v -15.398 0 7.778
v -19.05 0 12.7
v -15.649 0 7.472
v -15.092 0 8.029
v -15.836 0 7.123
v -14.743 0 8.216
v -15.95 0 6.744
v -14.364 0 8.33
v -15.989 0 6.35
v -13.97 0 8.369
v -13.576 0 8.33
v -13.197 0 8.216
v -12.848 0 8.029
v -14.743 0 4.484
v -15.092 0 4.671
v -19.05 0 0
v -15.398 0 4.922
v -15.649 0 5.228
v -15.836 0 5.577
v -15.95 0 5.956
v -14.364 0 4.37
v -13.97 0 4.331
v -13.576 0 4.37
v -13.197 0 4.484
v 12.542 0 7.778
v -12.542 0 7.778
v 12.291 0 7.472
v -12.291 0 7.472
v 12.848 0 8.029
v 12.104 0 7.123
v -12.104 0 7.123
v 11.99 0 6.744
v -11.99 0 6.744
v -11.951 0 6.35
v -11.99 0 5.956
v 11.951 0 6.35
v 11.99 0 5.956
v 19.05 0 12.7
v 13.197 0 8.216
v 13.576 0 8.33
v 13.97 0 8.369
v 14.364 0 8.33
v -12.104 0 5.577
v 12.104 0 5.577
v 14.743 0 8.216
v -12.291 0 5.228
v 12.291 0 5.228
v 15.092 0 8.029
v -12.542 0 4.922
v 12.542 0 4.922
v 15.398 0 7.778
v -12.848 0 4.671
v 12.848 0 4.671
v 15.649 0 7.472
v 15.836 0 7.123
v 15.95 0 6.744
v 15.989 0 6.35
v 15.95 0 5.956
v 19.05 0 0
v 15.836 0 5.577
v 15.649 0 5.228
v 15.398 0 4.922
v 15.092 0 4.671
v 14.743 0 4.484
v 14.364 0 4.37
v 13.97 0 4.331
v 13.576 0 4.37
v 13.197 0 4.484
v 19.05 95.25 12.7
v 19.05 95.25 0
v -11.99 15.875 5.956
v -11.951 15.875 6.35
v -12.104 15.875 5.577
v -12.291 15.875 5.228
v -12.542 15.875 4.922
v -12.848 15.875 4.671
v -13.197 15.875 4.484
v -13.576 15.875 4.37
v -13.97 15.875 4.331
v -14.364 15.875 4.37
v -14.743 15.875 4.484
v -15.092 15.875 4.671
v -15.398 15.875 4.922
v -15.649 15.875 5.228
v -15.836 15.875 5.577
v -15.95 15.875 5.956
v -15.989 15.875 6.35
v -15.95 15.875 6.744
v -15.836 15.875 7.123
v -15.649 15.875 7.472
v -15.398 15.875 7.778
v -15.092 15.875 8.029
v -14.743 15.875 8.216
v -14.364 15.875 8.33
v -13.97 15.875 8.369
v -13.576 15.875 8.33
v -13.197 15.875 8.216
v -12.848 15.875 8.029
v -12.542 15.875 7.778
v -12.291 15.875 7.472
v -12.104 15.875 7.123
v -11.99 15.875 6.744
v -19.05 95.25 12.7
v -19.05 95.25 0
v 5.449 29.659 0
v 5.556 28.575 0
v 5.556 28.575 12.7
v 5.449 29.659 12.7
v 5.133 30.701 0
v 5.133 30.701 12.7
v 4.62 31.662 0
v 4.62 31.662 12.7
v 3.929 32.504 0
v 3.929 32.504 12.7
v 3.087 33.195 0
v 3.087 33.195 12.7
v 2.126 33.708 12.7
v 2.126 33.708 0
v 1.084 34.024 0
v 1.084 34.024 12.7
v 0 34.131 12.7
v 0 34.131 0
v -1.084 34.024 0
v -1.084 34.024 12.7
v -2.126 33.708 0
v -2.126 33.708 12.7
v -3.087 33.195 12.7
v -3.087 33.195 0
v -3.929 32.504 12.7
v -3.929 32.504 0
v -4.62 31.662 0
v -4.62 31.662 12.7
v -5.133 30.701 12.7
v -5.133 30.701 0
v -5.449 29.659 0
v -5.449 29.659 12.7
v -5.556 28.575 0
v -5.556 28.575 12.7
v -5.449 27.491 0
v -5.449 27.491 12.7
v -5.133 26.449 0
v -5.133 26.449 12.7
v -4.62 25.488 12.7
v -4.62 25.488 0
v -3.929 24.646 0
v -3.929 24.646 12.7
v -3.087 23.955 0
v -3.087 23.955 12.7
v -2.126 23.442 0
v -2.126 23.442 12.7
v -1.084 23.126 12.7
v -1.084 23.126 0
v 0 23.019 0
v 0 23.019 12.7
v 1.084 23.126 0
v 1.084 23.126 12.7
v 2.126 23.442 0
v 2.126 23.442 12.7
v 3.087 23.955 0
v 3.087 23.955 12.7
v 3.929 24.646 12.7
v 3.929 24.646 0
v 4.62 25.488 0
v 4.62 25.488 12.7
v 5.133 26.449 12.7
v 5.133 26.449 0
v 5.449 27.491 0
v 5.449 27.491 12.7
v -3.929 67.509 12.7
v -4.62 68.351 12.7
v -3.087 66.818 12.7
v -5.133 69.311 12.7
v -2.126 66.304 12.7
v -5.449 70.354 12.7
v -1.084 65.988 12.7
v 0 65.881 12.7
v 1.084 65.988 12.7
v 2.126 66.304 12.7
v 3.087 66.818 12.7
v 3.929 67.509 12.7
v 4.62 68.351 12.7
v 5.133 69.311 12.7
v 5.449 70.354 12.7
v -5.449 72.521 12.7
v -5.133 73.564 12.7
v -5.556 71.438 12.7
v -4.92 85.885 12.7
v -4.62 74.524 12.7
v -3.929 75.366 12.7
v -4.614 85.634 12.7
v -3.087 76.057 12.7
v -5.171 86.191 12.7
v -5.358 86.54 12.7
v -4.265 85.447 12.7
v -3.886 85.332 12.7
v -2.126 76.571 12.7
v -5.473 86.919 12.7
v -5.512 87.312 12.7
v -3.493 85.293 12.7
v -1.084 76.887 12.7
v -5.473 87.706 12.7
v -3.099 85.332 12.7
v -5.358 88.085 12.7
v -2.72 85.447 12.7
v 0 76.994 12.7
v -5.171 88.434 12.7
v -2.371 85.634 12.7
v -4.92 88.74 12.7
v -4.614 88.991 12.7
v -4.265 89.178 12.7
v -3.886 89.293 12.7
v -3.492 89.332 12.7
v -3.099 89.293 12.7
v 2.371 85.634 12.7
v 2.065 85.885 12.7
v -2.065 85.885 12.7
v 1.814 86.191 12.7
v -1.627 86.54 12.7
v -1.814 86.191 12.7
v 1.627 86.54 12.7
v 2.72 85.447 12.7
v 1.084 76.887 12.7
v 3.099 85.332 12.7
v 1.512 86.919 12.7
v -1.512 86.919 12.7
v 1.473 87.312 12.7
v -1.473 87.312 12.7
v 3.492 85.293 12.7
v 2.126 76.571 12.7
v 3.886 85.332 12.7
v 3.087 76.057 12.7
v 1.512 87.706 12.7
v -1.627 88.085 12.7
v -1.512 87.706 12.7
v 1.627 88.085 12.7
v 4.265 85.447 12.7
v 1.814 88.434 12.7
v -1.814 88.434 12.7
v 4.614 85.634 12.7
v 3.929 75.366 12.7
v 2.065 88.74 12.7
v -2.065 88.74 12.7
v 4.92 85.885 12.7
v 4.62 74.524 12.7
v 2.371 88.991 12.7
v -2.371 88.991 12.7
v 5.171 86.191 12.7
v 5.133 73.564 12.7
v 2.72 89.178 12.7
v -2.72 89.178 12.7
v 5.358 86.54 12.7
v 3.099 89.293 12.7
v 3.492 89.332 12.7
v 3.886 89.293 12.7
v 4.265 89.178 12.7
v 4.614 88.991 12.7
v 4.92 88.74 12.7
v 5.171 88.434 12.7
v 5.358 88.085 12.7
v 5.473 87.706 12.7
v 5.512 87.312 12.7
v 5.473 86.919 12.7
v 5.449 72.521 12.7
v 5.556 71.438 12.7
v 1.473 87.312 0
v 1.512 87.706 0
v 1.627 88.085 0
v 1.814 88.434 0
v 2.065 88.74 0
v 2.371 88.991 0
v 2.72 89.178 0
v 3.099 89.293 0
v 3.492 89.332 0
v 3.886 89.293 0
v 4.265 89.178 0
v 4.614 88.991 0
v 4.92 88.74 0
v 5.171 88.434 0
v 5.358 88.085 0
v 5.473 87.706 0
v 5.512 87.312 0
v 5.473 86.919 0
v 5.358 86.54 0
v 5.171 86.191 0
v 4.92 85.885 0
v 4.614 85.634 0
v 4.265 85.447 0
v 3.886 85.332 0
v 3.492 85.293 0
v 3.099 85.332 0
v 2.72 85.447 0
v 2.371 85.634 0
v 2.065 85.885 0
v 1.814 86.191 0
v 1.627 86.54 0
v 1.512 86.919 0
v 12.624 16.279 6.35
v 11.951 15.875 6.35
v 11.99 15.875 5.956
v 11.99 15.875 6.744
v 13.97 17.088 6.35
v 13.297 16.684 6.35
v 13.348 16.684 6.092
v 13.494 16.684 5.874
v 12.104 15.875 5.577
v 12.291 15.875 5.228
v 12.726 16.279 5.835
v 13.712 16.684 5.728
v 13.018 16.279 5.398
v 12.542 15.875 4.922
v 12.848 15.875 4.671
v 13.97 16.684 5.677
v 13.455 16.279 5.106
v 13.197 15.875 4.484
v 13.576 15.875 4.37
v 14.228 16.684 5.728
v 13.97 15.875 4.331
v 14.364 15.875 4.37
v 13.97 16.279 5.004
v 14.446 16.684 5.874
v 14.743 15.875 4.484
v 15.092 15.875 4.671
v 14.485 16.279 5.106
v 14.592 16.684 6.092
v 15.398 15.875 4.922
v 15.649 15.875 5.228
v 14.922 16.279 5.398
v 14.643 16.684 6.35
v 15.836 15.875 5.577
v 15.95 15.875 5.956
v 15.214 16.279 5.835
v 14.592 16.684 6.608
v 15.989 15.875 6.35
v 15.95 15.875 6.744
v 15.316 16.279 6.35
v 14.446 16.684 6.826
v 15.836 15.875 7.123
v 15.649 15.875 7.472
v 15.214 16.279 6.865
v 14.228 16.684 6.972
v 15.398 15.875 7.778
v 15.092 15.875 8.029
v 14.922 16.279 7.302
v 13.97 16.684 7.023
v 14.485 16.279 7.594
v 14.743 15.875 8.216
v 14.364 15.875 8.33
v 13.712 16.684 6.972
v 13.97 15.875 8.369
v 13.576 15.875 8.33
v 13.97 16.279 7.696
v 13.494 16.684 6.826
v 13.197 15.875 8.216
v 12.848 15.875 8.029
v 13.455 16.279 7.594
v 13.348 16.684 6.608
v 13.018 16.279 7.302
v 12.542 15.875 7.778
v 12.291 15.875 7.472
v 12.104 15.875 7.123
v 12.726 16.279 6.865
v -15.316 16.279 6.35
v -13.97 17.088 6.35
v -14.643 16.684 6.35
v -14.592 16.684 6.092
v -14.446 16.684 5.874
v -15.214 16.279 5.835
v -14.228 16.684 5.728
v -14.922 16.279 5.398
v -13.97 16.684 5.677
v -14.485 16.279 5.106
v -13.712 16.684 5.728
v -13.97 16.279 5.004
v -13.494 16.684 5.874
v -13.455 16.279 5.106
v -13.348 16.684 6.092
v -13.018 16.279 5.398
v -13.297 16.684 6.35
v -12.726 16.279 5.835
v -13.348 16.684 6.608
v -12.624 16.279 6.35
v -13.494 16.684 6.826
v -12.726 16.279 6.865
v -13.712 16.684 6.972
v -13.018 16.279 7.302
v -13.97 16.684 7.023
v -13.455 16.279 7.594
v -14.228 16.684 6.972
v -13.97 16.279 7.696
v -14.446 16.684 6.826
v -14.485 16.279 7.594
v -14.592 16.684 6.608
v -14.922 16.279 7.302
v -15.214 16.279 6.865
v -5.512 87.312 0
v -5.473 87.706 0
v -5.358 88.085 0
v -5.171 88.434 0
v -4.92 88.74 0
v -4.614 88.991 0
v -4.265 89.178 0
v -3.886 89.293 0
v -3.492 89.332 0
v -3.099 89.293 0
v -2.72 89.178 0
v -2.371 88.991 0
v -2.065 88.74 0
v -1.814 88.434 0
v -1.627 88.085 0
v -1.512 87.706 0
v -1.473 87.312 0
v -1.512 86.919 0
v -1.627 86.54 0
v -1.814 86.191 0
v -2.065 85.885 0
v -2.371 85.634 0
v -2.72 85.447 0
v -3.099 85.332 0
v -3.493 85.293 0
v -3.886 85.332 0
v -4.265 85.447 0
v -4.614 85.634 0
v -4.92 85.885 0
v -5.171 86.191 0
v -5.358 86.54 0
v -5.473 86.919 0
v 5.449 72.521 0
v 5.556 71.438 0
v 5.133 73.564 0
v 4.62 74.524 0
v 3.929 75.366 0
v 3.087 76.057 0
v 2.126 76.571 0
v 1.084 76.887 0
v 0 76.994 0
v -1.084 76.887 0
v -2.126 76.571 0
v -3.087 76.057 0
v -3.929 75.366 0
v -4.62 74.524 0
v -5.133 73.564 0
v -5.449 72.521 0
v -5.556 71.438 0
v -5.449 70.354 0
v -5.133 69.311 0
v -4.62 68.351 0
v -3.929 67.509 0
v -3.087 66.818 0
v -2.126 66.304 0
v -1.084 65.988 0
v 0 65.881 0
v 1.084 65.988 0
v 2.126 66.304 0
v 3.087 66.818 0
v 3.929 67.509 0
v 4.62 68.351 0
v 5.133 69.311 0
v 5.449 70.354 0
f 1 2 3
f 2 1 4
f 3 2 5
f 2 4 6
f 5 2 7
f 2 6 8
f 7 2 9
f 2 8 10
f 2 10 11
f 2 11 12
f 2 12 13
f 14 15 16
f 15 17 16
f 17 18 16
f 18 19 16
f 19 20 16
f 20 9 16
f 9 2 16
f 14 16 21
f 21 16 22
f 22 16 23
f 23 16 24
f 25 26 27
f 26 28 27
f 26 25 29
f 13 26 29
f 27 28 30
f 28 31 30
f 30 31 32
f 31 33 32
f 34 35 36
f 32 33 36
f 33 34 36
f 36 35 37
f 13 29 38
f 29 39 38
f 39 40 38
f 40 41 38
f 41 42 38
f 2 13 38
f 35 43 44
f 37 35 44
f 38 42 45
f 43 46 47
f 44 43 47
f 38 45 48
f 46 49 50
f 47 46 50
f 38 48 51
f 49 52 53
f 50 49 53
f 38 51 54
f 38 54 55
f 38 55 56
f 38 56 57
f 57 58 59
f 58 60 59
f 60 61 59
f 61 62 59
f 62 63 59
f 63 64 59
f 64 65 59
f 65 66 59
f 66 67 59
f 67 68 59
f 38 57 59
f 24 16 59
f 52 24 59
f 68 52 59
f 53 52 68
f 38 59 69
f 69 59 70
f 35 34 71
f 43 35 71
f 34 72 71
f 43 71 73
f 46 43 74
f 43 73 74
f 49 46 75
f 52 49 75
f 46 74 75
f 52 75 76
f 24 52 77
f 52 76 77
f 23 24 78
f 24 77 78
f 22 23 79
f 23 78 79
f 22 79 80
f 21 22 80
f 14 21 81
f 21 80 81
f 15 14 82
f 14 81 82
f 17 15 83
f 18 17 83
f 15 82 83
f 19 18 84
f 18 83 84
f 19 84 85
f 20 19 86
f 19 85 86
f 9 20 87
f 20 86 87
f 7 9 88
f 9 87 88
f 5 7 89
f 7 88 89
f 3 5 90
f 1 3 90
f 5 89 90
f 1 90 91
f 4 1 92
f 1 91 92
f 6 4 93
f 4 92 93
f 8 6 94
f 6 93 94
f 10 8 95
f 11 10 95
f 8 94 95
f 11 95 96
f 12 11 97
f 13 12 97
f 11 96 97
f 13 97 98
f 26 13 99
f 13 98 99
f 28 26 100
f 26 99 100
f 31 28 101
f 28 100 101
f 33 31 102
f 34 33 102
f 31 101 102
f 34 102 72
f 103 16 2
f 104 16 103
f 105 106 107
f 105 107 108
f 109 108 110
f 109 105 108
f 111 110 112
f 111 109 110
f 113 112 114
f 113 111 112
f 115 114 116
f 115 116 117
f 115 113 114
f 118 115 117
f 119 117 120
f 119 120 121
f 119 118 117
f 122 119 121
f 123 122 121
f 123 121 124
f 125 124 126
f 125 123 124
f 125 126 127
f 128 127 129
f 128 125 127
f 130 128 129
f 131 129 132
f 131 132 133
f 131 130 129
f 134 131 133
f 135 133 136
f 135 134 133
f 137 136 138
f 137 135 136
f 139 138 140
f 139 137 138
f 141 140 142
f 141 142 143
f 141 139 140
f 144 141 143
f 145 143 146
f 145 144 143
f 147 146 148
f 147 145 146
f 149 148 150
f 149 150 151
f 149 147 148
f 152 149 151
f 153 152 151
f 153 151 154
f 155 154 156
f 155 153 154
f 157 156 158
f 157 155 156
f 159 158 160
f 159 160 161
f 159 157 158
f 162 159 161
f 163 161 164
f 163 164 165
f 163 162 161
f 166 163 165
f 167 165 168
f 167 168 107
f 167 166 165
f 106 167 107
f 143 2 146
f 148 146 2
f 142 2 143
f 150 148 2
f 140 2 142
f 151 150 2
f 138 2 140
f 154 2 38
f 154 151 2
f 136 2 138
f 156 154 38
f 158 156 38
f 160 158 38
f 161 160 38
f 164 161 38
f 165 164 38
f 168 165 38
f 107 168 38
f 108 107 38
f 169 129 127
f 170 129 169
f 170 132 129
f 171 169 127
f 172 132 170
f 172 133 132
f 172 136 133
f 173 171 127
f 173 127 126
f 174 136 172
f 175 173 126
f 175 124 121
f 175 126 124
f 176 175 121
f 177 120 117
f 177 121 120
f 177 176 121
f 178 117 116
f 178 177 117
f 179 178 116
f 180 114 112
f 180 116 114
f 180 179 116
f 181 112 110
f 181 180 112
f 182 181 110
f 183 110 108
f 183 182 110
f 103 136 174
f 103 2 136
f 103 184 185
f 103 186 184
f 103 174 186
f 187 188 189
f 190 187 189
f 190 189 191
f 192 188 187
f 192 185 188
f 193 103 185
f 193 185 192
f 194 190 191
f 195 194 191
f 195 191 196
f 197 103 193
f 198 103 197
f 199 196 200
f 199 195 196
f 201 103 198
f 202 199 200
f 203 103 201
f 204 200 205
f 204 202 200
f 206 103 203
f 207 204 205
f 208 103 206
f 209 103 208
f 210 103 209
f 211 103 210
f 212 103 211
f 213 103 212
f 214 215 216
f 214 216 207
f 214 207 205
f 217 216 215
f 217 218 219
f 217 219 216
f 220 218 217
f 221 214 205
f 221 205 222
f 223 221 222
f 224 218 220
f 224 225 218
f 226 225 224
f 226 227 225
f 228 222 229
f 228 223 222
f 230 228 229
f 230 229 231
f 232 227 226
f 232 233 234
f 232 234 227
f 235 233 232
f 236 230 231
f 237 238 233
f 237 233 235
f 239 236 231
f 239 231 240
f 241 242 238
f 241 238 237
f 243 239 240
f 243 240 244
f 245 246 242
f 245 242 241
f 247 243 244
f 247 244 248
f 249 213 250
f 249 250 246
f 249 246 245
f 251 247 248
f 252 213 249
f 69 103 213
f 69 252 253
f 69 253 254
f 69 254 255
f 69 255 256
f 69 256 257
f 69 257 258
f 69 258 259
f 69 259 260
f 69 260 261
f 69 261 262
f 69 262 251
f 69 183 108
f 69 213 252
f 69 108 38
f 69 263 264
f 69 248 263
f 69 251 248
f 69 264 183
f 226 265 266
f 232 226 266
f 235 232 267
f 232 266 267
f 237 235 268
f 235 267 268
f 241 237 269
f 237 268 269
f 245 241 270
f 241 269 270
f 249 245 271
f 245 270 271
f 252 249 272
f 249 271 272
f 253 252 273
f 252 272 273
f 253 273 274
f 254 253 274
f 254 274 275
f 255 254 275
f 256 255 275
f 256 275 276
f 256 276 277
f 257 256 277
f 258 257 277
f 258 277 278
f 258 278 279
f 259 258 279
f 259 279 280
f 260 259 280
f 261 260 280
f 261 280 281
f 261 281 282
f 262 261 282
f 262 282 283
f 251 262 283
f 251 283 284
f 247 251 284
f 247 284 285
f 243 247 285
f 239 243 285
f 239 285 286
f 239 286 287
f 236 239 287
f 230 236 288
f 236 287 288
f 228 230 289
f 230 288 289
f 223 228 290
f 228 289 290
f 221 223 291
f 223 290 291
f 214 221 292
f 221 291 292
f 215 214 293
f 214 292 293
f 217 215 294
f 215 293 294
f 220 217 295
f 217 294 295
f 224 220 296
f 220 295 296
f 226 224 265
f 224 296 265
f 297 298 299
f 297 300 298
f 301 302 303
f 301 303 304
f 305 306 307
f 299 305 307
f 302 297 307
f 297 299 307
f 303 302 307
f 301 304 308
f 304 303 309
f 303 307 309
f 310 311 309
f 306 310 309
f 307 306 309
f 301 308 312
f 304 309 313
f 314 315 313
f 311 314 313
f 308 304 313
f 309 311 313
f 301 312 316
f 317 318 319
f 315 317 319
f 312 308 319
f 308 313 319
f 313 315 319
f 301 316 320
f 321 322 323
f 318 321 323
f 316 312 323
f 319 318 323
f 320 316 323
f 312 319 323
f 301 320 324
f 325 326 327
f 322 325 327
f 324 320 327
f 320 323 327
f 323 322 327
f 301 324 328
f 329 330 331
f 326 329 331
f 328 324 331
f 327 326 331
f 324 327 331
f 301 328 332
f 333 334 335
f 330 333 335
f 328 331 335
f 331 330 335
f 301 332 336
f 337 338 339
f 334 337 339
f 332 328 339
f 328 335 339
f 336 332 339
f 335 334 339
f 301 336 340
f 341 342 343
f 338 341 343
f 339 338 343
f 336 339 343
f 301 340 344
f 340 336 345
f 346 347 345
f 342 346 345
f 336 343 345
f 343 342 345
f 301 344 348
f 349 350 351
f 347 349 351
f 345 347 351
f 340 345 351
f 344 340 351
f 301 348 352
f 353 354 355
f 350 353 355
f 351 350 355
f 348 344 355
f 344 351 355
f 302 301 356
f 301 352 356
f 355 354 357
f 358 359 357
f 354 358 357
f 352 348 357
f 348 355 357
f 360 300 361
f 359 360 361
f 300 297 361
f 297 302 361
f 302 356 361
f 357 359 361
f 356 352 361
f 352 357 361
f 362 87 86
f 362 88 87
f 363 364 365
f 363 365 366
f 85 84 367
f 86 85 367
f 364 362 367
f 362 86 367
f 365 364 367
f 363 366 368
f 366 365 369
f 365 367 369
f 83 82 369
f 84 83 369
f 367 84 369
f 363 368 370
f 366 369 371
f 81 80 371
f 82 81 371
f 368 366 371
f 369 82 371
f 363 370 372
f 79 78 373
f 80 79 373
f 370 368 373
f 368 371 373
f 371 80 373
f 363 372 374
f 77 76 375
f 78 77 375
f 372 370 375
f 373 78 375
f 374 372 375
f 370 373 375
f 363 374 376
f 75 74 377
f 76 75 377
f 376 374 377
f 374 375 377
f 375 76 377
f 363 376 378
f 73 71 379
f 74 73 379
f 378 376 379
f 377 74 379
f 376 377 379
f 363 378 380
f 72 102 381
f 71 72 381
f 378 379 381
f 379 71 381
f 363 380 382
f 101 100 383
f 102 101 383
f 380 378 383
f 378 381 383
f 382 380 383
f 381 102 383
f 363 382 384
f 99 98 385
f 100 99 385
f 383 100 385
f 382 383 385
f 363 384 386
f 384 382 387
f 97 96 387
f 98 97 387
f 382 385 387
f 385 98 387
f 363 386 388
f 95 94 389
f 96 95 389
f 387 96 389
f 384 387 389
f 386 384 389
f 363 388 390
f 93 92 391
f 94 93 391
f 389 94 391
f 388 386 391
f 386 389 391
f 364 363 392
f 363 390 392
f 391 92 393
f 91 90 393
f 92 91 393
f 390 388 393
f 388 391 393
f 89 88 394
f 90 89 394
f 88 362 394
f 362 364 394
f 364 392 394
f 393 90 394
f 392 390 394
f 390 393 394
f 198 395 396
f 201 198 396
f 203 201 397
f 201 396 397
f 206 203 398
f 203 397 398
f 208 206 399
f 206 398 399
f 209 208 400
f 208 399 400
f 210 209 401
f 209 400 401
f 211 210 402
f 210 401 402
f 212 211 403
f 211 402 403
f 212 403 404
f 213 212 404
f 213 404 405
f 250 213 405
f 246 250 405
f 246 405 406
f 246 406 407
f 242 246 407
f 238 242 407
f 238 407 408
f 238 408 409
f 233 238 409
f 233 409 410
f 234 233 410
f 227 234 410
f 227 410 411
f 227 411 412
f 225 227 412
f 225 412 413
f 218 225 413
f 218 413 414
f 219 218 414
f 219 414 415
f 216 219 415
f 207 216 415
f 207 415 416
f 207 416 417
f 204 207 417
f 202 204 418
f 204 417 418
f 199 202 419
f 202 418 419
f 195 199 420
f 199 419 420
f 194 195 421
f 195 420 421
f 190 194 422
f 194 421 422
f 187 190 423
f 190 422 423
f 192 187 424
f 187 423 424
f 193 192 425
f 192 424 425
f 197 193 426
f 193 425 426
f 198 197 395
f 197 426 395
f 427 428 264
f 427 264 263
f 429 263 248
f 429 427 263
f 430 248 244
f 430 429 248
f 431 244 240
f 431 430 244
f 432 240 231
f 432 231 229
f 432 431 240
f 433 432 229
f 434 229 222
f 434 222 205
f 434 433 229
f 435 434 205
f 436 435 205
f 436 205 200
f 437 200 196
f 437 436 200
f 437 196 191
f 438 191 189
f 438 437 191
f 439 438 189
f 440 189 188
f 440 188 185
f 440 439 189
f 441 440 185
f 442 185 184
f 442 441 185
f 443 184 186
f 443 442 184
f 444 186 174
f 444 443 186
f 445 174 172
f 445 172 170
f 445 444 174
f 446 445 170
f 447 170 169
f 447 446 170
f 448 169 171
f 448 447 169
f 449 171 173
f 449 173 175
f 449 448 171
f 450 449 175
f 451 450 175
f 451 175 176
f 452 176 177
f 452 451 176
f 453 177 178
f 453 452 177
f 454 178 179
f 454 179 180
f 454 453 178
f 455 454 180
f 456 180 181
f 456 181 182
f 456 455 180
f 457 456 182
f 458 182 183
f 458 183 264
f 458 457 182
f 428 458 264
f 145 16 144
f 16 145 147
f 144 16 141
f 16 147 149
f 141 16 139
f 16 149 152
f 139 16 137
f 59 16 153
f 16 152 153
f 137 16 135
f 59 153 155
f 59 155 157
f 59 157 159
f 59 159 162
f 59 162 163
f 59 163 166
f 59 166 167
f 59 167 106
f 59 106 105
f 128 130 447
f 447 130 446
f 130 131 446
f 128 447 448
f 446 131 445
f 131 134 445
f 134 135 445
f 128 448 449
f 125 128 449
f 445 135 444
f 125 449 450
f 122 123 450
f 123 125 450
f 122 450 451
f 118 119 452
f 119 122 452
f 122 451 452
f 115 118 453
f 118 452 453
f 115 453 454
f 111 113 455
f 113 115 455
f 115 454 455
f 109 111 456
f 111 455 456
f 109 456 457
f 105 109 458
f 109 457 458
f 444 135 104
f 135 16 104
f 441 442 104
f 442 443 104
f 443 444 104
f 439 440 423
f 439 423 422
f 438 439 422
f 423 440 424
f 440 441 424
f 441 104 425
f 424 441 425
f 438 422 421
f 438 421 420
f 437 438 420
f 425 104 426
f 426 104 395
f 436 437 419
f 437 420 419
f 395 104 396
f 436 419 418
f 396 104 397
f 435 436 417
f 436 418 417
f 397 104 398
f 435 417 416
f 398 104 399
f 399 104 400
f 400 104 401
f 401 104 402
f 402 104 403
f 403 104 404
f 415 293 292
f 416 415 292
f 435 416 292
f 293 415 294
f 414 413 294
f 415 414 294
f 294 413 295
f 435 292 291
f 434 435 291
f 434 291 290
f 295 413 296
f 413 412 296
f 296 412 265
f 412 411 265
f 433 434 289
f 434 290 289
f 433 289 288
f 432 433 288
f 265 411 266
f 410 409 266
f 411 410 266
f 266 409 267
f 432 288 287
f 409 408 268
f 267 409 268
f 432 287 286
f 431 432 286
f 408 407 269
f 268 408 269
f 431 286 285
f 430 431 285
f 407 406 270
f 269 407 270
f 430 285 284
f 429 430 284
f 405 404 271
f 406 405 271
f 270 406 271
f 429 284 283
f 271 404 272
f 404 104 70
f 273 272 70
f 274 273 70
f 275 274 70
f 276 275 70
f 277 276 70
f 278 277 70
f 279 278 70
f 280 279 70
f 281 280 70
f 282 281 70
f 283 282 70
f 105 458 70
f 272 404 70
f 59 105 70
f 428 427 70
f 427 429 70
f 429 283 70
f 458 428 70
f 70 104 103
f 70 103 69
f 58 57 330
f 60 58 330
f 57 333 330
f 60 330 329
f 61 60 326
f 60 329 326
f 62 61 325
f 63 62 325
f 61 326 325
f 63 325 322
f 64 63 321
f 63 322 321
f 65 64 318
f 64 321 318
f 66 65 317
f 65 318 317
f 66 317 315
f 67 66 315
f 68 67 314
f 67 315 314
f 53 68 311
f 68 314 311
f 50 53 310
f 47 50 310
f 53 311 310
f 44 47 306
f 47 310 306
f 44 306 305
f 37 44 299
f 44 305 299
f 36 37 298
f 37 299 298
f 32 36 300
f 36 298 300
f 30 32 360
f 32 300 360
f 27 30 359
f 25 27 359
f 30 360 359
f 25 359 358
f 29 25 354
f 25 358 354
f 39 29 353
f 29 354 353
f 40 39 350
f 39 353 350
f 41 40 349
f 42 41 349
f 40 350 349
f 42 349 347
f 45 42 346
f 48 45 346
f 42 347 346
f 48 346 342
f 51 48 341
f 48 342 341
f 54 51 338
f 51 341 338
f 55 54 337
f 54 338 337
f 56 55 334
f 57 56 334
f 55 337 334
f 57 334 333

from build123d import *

# Parameters (mm, degrees)
SKETCH1_W                  = 38.1
SKETCH1_H                  = 95.25
SKETCH1_R                  = 5.55625
BOSS_EXTRUDE1_DEPTH        = 12.7
F_10_32_TAPPED_HOLE1_D     = 4.0386
F_10_32_TAPPED_HOLE1_DEPTH = 15.875
F_10_32_TAPPED_HOLE1_TIP   = 1.213317848
F_10_32_TAPPED_HOLE2_D     = 4.0386


with BuildPart() as part:
    # Sketch1 → Boss-Extrude1 (new body)
    with BuildSketch(Plane.XY):
        with Locations((0, 47.625)):
            Rectangle(SKETCH1_W, SKETCH1_H)
        with Locations((0, 28.575)):
            Circle(SKETCH1_R, mode=Mode.SUBTRACT)
        with Locations((0, 71.4375)):
            Circle(SKETCH1_R, mode=Mode.SUBTRACT)
    extrude(amount=BOSS_EXTRUDE1_DEPTH)

    # #10-32 Tapped Hole1
    with Locations(Plane(origin=(0, 0, 0), x_dir=(-1, 0, 0), z_dir=(0, -1, 0))):
        with Locations((13.97, -6.35), (-13.97, -6.35)):
            Hole(F_10_32_TAPPED_HOLE1_D / 2, depth=F_10_32_TAPPED_HOLE1_DEPTH)
            with Locations((0, 0, -(F_10_32_TAPPED_HOLE1_DEPTH + F_10_32_TAPPED_HOLE1_TIP / 2))):  # 118° drill point
                Cone(0, F_10_32_TAPPED_HOLE1_D / 2, F_10_32_TAPPED_HOLE1_TIP, mode=Mode.SUBTRACT)

    # #10-32 Tapped Hole2 (through all)
    with Locations(Plane.XY.offset(12.7)):
        with Locations((-3.4925, 87.3125), (3.4925, 87.3125)):
            Hole(F_10_32_TAPPED_HOLE2_D / 2)


solid = part.part
